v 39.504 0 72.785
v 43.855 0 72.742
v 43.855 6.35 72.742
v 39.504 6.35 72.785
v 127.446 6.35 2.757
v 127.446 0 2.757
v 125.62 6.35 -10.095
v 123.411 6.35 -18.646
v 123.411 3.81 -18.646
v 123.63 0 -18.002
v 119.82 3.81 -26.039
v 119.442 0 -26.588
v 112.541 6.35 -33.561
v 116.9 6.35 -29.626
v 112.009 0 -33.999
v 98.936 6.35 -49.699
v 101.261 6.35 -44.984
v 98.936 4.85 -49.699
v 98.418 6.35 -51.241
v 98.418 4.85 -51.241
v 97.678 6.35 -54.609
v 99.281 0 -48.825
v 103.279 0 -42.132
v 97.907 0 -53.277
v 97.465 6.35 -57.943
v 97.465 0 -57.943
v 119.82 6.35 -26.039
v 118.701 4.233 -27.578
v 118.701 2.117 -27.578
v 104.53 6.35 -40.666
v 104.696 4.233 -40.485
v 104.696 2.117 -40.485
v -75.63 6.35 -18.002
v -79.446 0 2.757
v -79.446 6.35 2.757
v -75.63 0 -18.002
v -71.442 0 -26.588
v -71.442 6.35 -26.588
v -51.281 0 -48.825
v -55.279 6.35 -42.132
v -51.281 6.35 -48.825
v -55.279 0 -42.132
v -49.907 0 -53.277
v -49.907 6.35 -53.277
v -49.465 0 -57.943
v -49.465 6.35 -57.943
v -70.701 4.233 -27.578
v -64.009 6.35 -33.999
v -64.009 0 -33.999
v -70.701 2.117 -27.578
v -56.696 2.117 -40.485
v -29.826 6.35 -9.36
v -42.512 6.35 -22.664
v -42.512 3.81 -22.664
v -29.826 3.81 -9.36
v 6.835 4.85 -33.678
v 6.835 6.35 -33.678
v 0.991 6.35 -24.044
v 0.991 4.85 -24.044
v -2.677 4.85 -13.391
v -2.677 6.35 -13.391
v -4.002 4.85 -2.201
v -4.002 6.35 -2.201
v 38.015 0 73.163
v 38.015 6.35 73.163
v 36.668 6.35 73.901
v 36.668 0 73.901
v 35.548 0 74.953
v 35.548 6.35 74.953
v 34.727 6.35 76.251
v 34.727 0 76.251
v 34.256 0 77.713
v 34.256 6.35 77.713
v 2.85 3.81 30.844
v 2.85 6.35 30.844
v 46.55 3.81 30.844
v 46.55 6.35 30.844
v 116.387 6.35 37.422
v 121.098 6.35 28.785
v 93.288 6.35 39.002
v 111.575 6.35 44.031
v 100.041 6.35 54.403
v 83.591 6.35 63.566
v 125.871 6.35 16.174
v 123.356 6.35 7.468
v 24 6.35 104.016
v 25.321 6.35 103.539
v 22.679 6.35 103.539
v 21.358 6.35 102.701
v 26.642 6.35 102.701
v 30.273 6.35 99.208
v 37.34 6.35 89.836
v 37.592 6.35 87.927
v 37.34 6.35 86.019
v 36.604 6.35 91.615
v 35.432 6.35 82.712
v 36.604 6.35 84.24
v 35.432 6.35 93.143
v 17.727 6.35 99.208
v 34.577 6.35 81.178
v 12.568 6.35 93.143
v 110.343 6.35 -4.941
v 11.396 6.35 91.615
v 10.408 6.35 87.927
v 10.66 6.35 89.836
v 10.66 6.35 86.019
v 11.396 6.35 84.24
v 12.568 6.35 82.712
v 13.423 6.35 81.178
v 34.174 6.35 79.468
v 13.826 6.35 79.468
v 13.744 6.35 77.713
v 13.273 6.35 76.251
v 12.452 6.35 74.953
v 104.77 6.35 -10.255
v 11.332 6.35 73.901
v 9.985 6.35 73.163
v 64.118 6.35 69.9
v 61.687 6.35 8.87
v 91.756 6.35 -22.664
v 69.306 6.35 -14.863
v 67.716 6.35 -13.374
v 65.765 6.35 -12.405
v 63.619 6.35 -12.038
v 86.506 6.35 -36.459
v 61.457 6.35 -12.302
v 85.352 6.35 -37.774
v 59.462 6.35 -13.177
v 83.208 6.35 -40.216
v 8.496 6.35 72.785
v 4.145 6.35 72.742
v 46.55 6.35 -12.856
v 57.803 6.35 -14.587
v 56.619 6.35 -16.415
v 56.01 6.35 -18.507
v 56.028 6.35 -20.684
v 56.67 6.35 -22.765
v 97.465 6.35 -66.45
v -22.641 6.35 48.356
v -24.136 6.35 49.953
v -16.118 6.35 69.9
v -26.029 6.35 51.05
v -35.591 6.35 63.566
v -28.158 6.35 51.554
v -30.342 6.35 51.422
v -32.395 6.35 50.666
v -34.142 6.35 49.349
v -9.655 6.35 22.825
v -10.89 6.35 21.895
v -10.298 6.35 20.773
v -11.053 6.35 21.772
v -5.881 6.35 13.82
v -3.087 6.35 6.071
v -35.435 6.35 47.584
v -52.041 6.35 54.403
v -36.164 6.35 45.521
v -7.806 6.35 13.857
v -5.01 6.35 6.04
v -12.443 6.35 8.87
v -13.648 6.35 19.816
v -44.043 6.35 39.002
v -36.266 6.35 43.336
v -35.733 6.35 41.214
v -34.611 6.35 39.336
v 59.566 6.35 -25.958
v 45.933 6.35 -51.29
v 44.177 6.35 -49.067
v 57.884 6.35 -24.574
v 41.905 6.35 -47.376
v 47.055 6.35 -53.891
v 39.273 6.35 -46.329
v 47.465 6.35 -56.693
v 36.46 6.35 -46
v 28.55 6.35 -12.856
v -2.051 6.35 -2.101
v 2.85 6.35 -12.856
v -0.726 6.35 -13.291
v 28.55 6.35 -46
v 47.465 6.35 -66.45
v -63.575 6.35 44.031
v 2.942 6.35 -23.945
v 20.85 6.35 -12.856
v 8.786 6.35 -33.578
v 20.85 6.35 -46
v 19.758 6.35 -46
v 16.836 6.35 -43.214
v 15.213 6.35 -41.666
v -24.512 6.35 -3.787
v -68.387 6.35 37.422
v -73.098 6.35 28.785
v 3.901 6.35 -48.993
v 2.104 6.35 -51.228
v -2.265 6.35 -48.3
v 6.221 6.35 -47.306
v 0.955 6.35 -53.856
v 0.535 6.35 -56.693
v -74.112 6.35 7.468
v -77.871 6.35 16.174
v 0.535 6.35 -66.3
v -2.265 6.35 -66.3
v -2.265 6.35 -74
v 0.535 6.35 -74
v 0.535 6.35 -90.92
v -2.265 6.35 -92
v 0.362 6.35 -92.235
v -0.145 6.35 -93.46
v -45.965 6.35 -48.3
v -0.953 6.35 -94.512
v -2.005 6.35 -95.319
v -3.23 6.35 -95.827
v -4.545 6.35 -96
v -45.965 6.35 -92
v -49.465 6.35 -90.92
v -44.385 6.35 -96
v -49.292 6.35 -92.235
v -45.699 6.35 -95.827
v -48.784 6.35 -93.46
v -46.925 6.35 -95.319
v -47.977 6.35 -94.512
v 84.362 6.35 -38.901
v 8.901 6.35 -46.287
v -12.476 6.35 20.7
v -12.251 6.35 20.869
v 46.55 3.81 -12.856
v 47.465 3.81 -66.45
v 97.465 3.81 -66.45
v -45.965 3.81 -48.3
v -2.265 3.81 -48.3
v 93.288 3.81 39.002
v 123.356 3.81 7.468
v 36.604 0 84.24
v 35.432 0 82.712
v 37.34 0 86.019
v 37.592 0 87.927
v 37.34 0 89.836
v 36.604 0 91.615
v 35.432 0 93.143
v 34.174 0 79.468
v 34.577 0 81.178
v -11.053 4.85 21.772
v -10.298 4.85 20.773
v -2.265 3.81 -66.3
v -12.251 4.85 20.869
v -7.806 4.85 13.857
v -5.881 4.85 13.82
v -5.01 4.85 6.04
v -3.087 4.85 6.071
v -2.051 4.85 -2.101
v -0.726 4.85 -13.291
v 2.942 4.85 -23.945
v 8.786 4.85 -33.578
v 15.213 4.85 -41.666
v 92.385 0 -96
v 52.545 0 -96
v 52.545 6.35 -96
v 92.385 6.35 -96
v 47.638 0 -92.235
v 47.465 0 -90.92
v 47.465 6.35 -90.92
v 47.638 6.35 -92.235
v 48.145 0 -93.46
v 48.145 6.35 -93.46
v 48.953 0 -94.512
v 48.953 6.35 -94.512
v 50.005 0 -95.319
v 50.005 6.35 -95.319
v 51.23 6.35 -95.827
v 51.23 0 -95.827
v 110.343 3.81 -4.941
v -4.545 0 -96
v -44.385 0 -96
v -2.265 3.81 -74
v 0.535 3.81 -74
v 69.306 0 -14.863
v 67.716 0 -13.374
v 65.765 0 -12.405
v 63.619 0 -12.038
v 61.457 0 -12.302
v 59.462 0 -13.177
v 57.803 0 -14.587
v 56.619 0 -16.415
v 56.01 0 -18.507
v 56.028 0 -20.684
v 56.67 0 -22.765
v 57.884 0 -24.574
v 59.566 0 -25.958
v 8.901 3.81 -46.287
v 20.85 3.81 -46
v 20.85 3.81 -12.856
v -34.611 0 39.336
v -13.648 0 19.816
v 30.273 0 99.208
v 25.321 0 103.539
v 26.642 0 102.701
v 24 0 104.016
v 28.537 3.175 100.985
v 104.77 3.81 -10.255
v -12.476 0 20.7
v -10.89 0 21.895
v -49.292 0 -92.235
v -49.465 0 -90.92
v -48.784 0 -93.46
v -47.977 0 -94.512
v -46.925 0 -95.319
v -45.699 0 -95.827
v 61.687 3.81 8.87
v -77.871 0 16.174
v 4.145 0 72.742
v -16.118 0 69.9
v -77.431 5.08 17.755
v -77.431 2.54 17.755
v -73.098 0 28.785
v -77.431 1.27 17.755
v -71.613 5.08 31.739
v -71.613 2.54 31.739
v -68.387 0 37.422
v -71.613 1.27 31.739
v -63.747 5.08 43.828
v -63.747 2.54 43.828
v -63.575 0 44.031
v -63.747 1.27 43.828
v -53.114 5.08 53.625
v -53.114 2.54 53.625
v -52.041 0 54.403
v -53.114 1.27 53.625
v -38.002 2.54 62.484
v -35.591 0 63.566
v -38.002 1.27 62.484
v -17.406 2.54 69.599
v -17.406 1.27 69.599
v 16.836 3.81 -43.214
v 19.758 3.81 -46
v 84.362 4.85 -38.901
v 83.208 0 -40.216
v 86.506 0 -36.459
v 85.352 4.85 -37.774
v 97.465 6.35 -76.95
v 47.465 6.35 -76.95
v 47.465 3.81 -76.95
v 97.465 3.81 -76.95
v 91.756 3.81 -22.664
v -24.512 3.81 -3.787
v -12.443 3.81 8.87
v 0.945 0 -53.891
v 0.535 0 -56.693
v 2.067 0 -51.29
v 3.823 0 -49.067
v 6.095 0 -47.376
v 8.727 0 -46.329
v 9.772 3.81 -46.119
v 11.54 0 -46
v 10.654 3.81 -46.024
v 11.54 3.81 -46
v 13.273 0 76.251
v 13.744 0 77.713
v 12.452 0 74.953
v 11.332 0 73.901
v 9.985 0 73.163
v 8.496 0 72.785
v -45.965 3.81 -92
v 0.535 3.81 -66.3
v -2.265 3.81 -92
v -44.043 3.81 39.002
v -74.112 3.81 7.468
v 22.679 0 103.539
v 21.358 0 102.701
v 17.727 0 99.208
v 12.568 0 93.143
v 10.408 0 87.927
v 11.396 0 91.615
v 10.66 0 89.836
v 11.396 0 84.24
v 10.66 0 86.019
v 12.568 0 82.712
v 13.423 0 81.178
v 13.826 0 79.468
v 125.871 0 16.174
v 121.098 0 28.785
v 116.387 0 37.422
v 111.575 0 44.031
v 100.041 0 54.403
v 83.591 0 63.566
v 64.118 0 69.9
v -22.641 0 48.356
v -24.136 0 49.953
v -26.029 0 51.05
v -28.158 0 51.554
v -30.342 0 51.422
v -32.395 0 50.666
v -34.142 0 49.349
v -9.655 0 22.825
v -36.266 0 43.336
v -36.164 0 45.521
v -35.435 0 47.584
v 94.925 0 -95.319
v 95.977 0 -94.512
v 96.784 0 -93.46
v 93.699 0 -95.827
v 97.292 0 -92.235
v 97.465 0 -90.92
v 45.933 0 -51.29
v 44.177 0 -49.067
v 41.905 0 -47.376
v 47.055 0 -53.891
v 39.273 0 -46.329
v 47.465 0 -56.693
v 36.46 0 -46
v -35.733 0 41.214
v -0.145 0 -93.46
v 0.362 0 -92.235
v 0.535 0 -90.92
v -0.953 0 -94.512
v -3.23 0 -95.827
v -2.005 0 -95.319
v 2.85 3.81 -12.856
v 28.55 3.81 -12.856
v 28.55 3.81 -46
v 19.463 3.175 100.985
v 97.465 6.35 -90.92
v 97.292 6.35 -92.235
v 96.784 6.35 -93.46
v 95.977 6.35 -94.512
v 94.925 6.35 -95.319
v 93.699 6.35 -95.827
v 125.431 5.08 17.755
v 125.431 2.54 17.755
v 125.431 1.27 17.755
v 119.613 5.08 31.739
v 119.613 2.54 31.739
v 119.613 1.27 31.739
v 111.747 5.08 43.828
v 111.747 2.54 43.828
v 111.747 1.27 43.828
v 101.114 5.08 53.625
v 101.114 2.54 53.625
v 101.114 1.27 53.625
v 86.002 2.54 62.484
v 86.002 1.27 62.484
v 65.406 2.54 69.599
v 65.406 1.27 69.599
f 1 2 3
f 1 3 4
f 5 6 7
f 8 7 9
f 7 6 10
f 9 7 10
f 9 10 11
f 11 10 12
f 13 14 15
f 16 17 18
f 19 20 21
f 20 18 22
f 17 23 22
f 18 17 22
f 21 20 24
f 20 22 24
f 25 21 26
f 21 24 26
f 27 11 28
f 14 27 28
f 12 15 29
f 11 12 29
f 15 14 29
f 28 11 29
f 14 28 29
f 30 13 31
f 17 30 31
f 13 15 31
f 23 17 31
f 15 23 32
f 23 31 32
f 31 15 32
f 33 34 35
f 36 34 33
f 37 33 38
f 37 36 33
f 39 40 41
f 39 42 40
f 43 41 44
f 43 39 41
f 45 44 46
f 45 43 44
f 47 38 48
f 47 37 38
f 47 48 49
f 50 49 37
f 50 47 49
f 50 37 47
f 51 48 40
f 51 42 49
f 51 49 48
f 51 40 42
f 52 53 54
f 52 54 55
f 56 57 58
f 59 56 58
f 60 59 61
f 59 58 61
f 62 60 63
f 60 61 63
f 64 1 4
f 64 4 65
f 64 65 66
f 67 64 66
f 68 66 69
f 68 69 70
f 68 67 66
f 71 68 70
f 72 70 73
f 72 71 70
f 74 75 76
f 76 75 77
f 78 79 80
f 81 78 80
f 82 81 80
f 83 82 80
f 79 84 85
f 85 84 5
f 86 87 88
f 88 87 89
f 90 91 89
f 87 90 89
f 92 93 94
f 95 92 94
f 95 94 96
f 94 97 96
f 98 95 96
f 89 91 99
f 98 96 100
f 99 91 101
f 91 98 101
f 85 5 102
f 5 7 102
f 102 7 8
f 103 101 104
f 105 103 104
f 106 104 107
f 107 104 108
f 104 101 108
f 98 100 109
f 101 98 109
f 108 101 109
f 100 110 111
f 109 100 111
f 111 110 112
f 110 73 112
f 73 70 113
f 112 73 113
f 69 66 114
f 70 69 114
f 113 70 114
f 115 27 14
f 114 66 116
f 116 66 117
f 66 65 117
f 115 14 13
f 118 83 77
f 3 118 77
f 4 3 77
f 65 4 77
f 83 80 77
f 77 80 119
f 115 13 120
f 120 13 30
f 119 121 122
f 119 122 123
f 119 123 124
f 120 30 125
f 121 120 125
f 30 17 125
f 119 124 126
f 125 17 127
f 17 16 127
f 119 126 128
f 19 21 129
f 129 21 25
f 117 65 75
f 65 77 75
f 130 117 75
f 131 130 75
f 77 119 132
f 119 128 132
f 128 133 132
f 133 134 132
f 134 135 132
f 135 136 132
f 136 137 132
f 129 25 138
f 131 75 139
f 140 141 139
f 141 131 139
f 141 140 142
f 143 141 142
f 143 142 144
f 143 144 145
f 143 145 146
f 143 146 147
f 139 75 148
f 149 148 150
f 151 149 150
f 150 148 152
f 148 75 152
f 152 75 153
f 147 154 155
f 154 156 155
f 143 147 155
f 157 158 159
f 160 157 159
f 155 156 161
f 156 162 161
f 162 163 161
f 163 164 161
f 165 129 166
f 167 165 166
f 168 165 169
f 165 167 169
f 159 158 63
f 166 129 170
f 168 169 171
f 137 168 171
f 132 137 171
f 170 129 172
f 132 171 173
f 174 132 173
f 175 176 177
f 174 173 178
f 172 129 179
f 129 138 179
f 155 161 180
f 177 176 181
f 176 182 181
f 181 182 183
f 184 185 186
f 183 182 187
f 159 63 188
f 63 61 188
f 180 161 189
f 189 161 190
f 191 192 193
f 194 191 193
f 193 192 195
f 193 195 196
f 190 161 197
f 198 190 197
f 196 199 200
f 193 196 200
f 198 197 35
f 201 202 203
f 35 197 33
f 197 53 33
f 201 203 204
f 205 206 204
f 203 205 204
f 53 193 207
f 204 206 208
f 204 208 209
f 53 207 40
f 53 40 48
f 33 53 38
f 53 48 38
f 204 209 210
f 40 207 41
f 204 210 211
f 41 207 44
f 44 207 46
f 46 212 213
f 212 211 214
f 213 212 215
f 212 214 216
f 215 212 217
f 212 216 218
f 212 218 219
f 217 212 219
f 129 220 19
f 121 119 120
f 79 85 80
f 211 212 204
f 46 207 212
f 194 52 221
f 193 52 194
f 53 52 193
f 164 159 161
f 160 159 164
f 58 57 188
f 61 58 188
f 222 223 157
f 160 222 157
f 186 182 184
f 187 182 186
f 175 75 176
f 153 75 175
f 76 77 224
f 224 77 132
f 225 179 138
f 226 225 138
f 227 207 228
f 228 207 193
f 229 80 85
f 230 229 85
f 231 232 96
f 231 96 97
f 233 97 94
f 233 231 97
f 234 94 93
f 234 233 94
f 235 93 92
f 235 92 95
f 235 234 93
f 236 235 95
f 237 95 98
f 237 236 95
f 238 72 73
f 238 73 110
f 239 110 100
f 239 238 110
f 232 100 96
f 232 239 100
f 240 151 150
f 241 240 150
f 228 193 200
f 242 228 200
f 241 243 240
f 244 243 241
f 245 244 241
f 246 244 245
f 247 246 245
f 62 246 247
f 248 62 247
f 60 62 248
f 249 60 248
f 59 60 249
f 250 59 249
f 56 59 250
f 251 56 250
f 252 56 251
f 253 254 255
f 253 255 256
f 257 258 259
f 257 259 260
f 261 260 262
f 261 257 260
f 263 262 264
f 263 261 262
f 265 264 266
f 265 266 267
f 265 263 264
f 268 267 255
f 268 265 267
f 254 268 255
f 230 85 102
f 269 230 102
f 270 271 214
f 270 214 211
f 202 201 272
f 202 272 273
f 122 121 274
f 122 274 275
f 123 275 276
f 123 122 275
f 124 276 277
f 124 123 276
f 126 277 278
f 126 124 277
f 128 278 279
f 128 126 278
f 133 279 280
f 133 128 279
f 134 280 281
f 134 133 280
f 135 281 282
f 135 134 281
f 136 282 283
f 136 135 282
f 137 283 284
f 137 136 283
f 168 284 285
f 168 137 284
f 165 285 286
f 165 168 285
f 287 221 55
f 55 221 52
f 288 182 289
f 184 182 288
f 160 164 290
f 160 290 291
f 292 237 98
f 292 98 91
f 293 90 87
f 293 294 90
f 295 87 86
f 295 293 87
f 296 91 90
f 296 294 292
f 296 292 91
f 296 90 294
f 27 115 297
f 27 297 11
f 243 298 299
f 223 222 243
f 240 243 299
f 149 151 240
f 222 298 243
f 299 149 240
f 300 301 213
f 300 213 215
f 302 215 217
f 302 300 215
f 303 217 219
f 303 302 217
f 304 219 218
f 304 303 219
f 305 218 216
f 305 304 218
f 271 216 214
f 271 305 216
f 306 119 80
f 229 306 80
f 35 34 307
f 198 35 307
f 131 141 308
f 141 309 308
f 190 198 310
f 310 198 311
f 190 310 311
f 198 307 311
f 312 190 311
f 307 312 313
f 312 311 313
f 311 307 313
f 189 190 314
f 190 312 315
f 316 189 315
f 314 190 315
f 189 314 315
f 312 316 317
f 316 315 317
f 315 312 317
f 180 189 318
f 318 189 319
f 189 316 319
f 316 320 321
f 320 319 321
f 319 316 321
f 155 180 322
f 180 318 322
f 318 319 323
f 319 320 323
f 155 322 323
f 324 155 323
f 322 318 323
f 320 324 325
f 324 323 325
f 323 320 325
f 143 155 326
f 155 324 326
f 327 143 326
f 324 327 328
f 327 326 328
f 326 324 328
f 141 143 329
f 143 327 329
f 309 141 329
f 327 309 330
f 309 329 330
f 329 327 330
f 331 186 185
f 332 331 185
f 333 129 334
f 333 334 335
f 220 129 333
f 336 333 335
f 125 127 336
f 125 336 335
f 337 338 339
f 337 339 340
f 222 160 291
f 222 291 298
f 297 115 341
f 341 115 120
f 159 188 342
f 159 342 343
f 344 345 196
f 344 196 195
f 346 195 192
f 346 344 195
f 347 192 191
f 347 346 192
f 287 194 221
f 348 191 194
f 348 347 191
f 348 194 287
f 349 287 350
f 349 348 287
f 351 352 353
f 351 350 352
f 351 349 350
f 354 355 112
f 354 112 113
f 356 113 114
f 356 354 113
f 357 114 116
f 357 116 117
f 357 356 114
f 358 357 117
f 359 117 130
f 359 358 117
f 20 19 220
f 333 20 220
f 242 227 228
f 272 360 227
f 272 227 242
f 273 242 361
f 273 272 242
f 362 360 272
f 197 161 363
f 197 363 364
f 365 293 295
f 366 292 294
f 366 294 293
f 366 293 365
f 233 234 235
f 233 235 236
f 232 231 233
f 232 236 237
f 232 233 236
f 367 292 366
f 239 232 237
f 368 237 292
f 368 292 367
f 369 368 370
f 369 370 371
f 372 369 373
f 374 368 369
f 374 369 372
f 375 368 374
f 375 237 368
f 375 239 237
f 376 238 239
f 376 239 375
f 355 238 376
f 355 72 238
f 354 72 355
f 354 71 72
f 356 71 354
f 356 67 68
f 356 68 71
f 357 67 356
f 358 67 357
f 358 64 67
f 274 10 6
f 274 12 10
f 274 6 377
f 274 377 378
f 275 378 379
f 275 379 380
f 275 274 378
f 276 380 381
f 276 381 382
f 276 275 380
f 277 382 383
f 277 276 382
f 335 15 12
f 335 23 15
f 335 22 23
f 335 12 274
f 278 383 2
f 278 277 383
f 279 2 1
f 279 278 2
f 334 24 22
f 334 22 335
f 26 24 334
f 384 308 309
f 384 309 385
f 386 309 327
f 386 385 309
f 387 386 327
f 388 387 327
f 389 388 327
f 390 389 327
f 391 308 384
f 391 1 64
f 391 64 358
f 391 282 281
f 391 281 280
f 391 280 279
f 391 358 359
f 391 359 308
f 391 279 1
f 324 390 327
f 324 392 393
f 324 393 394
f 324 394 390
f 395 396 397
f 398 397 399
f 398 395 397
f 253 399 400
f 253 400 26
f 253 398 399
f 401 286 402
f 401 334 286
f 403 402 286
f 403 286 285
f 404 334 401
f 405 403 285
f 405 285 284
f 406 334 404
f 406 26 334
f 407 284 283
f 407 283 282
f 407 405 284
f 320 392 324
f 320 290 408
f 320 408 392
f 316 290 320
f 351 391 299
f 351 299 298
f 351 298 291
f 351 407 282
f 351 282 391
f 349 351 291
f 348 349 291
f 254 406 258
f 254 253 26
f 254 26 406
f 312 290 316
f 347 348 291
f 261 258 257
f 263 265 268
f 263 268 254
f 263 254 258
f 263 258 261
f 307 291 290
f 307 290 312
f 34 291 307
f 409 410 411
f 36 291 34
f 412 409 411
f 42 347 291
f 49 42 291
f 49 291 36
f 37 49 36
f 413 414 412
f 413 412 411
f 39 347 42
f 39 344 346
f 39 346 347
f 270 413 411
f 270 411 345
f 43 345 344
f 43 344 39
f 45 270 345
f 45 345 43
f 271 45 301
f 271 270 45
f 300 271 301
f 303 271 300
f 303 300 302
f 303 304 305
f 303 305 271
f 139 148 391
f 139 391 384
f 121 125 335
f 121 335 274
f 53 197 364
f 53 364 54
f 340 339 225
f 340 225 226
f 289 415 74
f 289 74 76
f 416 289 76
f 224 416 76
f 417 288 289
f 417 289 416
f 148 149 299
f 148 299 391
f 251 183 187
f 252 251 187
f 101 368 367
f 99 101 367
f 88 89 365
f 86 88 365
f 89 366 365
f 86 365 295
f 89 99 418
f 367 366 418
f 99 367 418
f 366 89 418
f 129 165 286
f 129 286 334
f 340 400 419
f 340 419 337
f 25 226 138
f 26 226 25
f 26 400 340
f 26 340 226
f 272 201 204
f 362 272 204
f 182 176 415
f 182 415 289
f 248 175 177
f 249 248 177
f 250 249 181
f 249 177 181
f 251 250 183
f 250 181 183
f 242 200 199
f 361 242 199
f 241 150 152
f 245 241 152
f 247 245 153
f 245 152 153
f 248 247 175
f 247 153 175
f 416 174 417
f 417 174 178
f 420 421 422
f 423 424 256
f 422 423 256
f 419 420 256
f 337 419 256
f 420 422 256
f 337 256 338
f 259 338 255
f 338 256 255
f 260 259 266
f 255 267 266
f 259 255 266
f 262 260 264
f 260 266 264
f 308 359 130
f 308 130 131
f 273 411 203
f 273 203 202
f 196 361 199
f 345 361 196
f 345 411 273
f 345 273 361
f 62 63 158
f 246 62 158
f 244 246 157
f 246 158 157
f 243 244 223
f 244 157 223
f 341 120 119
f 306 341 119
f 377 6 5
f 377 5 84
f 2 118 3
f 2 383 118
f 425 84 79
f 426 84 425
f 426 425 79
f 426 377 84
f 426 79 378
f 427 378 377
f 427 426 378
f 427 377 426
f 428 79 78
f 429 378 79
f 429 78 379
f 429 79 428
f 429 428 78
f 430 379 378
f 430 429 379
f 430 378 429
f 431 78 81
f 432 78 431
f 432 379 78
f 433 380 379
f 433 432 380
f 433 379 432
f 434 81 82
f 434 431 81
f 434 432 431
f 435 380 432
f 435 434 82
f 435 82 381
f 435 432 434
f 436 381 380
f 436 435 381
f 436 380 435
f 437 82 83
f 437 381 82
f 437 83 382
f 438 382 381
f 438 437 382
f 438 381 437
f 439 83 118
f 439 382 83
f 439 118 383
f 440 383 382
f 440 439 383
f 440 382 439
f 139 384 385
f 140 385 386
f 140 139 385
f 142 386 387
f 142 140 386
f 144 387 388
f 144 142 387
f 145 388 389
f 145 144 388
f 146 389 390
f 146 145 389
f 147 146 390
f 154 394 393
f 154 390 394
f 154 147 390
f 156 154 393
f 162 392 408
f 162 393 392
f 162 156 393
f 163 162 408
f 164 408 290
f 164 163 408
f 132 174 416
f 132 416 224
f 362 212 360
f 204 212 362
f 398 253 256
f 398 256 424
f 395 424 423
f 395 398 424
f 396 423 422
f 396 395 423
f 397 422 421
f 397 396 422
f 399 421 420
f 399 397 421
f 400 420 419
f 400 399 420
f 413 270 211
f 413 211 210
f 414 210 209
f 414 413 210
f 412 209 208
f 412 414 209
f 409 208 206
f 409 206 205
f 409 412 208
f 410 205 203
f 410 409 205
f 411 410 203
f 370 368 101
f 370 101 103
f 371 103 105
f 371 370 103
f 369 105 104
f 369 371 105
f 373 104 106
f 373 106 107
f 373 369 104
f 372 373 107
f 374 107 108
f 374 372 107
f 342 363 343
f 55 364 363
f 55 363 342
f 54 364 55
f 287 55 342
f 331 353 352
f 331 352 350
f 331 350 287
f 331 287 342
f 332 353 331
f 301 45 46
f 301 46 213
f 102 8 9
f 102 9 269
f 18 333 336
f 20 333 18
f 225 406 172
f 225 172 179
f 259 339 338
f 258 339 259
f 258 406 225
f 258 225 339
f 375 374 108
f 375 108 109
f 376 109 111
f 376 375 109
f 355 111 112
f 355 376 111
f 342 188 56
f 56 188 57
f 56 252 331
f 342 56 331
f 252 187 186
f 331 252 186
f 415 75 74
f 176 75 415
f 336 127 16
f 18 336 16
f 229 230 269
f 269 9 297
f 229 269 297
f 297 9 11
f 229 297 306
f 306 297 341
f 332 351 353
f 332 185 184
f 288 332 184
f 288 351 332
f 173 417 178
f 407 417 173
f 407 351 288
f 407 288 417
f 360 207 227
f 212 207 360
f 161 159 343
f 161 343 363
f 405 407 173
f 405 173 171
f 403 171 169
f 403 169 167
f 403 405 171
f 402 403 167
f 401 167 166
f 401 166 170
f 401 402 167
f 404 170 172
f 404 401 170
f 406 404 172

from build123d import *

# Parameters (mm, degrees)
BOSS_EXTRUDE1_DEPTH = 6.35
SKETCH2_W           = 43.7
SKETCH2_H           = 43.7
CUT_EXTRUDE1_DEPTH  = 2.54
CUT_EXTRUDE3_DEPTH  = 2.54
SKETCH4_W           = 2.8
SKETCH4_H           = 7.7
SKETCH4_W_2         = 7.7
SKETCH4_H_2         = 33.528
CUT_EXTRUDE4_DEPTH  = 2.54
CUT_EXTRUDE6_DEPTH  = 165.648464375
CUT_EXTRUDE7_DEPTH  = 1.5
SKETCH9_W           = 50
SKETCH9_H           = 10.5
CUT_EXTRUDE8_DEPTH  = 2.54


with BuildPart() as part:
    # Sketch1 → Boss-Extrude1 (new body)
    with BuildSketch(Plane(origin=(0, 0, 0), x_dir=(1, 0, 0), z_dir=(0, 1, 0))):
        with BuildLine():
            Line((52.544610399, 96), (92.384610399, 96))
            ThreePointArc((92.384610399, 96), (95.976712847, 94.512102448), (97.464610399, 90.92))
            Line((97.464610399, 90.92), (97.464610399, 57.942930422))
            add(Edge.make_bspline(
                [(127.445958891, -2.757399797), (126.217398064, 6.772879157), (124.527871566, 26.937506289), (103.198818931, 39.120916323), (97.37297865, 51.416446236), (97.464610399, 57.942930422)],
                knots=[0, 0, 0, 0, 0.4542014, 0.725733713, 1, 1, 1, 1], degree=3))
            add(Edge.make_bspline(
                [(127.445958891, -2.757399797), (127.822967418, -13.097877655), (122.880457127, -26.665652965), (112.775276891, -43.705151038), (101.21628269, -54.346897272), (78.643551493, -67.273421727), (58.317264726, -71.917502632), (43.855300998, -72.741727337)],
                knots=[0, 0, 0, 0, 0.251847695, 0.354064973, 0.49200618, 0.63769577, 1, 1, 1, 1], degree=3))
            Line((43.855300998, -72.741727337), (39.503738361, -72.784901588))
            ThreePointArc((39.503738361, -72.784901588), (36.074693376, -74.391591034), (34.256026209, -77.71307417))
            ThreePointArc((34.256026209, -77.71307417), (34.316151416, -80.336736497), (35.431566201, -82.712250947))
            ThreePointArc((35.431566201, -82.712250947), (37.591781392, -87.927471757), (35.431566201, -93.142692568))
            add(Edge.make_bspline(
                [(35.431566201, -93.142692568), (33.316240589, -95.95188132), (29.837032497, -99.83422186), (25.835087368, -103.598548459), (24, -104.01567246)],
                knots=[0, 0, 0, 0, 0.654699401, 1, 1, 1, 1], degree=3))
            add(Edge.make_bspline(
                [(12.568433799, -93.142692568), (14.683759411, -95.95188132), (18.162967503, -99.83422186), (22.164912632, -103.598548459), (24, -104.01567246)],
                knots=[0, 0, 0, 0, 0.654699401, 1, 1, 1, 1], degree=3))
            ThreePointArc((12.568433799, -93.142692568), (10.408218608, -87.927471757), (12.568433799, -82.712250947))
            ThreePointArc((12.568433799, -82.712250947), (13.683848584, -80.336736497), (13.743973791, -77.71307417))
            ThreePointArc((13.743973791, -77.71307417), (11.925306624, -74.391591034), (8.496261639, -72.784901588))
            Line((8.496261639, -72.784901588), (4.144699002, -72.741727337))
            add(Edge.make_bspline(
                [(-79.445958891, -2.757399797), (-79.822967418, -13.097877655), (-74.880457127, -26.665652965), (-64.775276891, -43.705151038), (-53.21628269, -54.346897272), (-30.643551493, -67.273421727), (-10.317264726, -71.917502632), (4.144699002, -72.741727337)],
                knots=[0, 0, 0, 0, 0.251847695, 0.354064973, 0.49200618, 0.63769577, 1, 1, 1, 1], degree=3))
            add(Edge.make_bspline(
                [(-79.445958891, -2.757399797), (-78.217398064, 6.772879157), (-76.527871566, 26.937506289), (-55.198818931, 39.120916323), (-49.37297865, 51.416446236), (-49.464610399, 57.942930422)],
                knots=[0, 0, 0, 0, 0.4542014, 0.725733713, 1, 1, 1, 1], degree=3))
            Line((-49.464610399, 57.942930422), (-49.464610399, 90.92))
            ThreePointArc((-49.464610399, 90.92), (-47.976712847, 94.512102448), (-44.384610399, 96))
            Line((-44.384610399, 96), (-4.544610399, 96))
            ThreePointArc((-4.544610399, 96), (-0.95250795, 94.512102448), (0.535389601, 90.92))
            Line((0.535389601, 90.92), (0.535389601, 56.693089242))
            ThreePointArc((0.535389601, 56.693089242), (3.823086605, 49.0674139), (11.540006197, 46))
            Line((11.540006197, 46), (36.459993803, 46))
            ThreePointArc((36.459993803, 46), (44.176913395, 49.0674139), (47.464610399, 56.693089242))
            Line((47.464610399, 56.693089242), (47.464610399, 90.92))
            ThreePointArc((47.464610399, 90.92), (48.95250795, 94.512102448), (52.544610399, 96))
        make_face()
    extrude(amount=BOSS_EXTRUDE1_DEPTH)

    # Sketch2 → Cut-Extrude1 (cut)
    with BuildSketch(Plane(origin=(0, 6.35, 0), x_dir=(1, 0, 0), z_dir=(0, 1, 0))):
        with Locations((-24.114610399, 70.15)):
            Rectangle(SKETCH2_W, SKETCH2_H)
        with Locations((24.69959658, -8.994026969)):
            Rectangle(SKETCH2_W, SKETCH2_H)
        Polygon((91.756041109, 22.663971871), (61.687394919, -8.87), (93.287751095, -39.001945738), (123.356397284, -7.467973867), align=None)
        Polygon((-44.043312702, -39.001945738), (-74.111958891, -7.467973867), (-42.511602716, 22.663971871), (-12.442956526, -8.87), align=None)
    extrude(amount=-CUT_EXTRUDE1_DEPTH, mode=Mode.SUBTRACT)

    # Sketch5 → Cut-Extrude3 (cut)
    with BuildSketch(Plane(origin=(0, 6.35, 0), x_dir=(1, 0, 0), z_dir=(0, 1, 0))):
        Polygon((104.769890137, 10.254852474), (122.226588264, 28.562262267), (128.147086585, 23.613346709), (110.342548256, 4.94114553), align=None)
        Polygon((11.522520215, 48.786329059), (-29.825516941, 9.359659151), (-24.511809997, 3.787001032), (16.836227159, 43.213670941), (19.758341498, 46), align=None)
    extrude(amount=-CUT_EXTRUDE3_DEPTH, mode=Mode.SUBTRACT)

    # Sketch4 → Cut-Extrude4 (cut)
    with BuildSketch(Plane(origin=(0, 6.35, 0), x_dir=(1, 0, 0), z_dir=(0, 1, 0))):
        with Locations((-0.864610399, 70.15)):
            Rectangle(SKETCH4_W, SKETCH4_H)
        with Locations((24.700041109, 29.236)):
            Rectangle(SKETCH4_W_2, SKETCH4_H_2)
    extrude(amount=-CUT_EXTRUDE4_DEPTH, mode=Mode.SUBTRACT)

    # Sketch6 → Cut-Extrude6 (cut, through all)
    with BuildSketch(Plane(origin=(0, 6.35, 0), x_dir=(1, 0, 0), z_dir=(0, 1, 0))):
        with BuildLine():
            Line((86.506282583, 36.458848797), (69.305686566, 14.862795995))
            ThreePointArc((69.305686566, 14.862795995), (57.802795593, 14.587410011), (59.565699046, 25.95774464))
            Line((59.565699046, 25.95774464), (83.207643636, 40.216372063))
            Line((83.207643636, 40.216372063), (86.506282583, 36.458848797))
        make_face()
        with BuildLine():
            Line((-10.890245417, -21.894543883), (-9.654995767, -22.825371259))
            Line((-9.654995767, -22.825371259), (-22.640520119, -48.35628634))
            ThreePointArc((-22.640520119, -48.35628634), (-33.316925376, -50.071712063), (-34.61076845, -39.336057229))
            Line((-34.61076845, -39.336057229), (-13.648173317, -19.816296144))
            Line((-13.648173317, -19.816296144), (-12.475776388, -20.699760598))
            Line((-12.475776388, -20.699760598), (-10.890245417, -21.894543883))
        make_face()
    extrude(amount=-CUT_EXTRUDE6_DEPTH, mode=Mode.SUBTRACT)

    # Sketch8 → Cut-Extrude7 (cut)
    with BuildSketch(Plane(origin=(0, 6.35, 0), x_dir=(1, 0, 0), z_dir=(0, 1, 0))):
        with BuildLine():
            ThreePointArc((-10.298257622, -20.773023834), (-4.271120984, -10.022070609), (-2.051088275, 2.101494298))
            ThreePointArc((-2.051088275, 2.101494298), (0.822630209, 18.715850278), (8.785888639, 33.577936193))
            Line((8.785888639, 33.577936193), (15.212793605, 41.665675358))
            Line((15.212793605, 41.665675358), (6.835409986, 33.67757335))
            ThreePointArc((6.835409986, 33.67757335), (-1.127848444, 18.815487435), (-4.001566928, 2.201131456))
            ThreePointArc((-4.001566928, 2.201131456), (-6.191058386, -10.025989743), (-12.251111868, -20.869057457))
            Line((-12.251111868, -20.869057457), (-11.052607664, -21.772195154))
            Line((-11.052607664, -21.772195154), (-10.298257622, -20.773023834))
        make_face()
        Polygon((85.351758952, 37.77398194), (102.619850578, 52.933222628), (101.470052745, 53.919838498), (84.362167268, 38.90123892), align=None)
    extrude(amount=-CUT_EXTRUDE7_DEPTH, mode=Mode.SUBTRACT)

    # Sketch9 → Cut-Extrude8 (cut)
    with BuildSketch(Plane(origin=(0, 6.35, 0), x_dir=(1, 0, 0), z_dir=(0, 1, 0))):
        with Locations((72.464610399, 71.7)):
            Rectangle(SKETCH9_W, SKETCH9_H)
    extrude(amount=-CUT_EXTRUDE8_DEPTH, mode=Mode.SUBTRACT)


solid = part.part
